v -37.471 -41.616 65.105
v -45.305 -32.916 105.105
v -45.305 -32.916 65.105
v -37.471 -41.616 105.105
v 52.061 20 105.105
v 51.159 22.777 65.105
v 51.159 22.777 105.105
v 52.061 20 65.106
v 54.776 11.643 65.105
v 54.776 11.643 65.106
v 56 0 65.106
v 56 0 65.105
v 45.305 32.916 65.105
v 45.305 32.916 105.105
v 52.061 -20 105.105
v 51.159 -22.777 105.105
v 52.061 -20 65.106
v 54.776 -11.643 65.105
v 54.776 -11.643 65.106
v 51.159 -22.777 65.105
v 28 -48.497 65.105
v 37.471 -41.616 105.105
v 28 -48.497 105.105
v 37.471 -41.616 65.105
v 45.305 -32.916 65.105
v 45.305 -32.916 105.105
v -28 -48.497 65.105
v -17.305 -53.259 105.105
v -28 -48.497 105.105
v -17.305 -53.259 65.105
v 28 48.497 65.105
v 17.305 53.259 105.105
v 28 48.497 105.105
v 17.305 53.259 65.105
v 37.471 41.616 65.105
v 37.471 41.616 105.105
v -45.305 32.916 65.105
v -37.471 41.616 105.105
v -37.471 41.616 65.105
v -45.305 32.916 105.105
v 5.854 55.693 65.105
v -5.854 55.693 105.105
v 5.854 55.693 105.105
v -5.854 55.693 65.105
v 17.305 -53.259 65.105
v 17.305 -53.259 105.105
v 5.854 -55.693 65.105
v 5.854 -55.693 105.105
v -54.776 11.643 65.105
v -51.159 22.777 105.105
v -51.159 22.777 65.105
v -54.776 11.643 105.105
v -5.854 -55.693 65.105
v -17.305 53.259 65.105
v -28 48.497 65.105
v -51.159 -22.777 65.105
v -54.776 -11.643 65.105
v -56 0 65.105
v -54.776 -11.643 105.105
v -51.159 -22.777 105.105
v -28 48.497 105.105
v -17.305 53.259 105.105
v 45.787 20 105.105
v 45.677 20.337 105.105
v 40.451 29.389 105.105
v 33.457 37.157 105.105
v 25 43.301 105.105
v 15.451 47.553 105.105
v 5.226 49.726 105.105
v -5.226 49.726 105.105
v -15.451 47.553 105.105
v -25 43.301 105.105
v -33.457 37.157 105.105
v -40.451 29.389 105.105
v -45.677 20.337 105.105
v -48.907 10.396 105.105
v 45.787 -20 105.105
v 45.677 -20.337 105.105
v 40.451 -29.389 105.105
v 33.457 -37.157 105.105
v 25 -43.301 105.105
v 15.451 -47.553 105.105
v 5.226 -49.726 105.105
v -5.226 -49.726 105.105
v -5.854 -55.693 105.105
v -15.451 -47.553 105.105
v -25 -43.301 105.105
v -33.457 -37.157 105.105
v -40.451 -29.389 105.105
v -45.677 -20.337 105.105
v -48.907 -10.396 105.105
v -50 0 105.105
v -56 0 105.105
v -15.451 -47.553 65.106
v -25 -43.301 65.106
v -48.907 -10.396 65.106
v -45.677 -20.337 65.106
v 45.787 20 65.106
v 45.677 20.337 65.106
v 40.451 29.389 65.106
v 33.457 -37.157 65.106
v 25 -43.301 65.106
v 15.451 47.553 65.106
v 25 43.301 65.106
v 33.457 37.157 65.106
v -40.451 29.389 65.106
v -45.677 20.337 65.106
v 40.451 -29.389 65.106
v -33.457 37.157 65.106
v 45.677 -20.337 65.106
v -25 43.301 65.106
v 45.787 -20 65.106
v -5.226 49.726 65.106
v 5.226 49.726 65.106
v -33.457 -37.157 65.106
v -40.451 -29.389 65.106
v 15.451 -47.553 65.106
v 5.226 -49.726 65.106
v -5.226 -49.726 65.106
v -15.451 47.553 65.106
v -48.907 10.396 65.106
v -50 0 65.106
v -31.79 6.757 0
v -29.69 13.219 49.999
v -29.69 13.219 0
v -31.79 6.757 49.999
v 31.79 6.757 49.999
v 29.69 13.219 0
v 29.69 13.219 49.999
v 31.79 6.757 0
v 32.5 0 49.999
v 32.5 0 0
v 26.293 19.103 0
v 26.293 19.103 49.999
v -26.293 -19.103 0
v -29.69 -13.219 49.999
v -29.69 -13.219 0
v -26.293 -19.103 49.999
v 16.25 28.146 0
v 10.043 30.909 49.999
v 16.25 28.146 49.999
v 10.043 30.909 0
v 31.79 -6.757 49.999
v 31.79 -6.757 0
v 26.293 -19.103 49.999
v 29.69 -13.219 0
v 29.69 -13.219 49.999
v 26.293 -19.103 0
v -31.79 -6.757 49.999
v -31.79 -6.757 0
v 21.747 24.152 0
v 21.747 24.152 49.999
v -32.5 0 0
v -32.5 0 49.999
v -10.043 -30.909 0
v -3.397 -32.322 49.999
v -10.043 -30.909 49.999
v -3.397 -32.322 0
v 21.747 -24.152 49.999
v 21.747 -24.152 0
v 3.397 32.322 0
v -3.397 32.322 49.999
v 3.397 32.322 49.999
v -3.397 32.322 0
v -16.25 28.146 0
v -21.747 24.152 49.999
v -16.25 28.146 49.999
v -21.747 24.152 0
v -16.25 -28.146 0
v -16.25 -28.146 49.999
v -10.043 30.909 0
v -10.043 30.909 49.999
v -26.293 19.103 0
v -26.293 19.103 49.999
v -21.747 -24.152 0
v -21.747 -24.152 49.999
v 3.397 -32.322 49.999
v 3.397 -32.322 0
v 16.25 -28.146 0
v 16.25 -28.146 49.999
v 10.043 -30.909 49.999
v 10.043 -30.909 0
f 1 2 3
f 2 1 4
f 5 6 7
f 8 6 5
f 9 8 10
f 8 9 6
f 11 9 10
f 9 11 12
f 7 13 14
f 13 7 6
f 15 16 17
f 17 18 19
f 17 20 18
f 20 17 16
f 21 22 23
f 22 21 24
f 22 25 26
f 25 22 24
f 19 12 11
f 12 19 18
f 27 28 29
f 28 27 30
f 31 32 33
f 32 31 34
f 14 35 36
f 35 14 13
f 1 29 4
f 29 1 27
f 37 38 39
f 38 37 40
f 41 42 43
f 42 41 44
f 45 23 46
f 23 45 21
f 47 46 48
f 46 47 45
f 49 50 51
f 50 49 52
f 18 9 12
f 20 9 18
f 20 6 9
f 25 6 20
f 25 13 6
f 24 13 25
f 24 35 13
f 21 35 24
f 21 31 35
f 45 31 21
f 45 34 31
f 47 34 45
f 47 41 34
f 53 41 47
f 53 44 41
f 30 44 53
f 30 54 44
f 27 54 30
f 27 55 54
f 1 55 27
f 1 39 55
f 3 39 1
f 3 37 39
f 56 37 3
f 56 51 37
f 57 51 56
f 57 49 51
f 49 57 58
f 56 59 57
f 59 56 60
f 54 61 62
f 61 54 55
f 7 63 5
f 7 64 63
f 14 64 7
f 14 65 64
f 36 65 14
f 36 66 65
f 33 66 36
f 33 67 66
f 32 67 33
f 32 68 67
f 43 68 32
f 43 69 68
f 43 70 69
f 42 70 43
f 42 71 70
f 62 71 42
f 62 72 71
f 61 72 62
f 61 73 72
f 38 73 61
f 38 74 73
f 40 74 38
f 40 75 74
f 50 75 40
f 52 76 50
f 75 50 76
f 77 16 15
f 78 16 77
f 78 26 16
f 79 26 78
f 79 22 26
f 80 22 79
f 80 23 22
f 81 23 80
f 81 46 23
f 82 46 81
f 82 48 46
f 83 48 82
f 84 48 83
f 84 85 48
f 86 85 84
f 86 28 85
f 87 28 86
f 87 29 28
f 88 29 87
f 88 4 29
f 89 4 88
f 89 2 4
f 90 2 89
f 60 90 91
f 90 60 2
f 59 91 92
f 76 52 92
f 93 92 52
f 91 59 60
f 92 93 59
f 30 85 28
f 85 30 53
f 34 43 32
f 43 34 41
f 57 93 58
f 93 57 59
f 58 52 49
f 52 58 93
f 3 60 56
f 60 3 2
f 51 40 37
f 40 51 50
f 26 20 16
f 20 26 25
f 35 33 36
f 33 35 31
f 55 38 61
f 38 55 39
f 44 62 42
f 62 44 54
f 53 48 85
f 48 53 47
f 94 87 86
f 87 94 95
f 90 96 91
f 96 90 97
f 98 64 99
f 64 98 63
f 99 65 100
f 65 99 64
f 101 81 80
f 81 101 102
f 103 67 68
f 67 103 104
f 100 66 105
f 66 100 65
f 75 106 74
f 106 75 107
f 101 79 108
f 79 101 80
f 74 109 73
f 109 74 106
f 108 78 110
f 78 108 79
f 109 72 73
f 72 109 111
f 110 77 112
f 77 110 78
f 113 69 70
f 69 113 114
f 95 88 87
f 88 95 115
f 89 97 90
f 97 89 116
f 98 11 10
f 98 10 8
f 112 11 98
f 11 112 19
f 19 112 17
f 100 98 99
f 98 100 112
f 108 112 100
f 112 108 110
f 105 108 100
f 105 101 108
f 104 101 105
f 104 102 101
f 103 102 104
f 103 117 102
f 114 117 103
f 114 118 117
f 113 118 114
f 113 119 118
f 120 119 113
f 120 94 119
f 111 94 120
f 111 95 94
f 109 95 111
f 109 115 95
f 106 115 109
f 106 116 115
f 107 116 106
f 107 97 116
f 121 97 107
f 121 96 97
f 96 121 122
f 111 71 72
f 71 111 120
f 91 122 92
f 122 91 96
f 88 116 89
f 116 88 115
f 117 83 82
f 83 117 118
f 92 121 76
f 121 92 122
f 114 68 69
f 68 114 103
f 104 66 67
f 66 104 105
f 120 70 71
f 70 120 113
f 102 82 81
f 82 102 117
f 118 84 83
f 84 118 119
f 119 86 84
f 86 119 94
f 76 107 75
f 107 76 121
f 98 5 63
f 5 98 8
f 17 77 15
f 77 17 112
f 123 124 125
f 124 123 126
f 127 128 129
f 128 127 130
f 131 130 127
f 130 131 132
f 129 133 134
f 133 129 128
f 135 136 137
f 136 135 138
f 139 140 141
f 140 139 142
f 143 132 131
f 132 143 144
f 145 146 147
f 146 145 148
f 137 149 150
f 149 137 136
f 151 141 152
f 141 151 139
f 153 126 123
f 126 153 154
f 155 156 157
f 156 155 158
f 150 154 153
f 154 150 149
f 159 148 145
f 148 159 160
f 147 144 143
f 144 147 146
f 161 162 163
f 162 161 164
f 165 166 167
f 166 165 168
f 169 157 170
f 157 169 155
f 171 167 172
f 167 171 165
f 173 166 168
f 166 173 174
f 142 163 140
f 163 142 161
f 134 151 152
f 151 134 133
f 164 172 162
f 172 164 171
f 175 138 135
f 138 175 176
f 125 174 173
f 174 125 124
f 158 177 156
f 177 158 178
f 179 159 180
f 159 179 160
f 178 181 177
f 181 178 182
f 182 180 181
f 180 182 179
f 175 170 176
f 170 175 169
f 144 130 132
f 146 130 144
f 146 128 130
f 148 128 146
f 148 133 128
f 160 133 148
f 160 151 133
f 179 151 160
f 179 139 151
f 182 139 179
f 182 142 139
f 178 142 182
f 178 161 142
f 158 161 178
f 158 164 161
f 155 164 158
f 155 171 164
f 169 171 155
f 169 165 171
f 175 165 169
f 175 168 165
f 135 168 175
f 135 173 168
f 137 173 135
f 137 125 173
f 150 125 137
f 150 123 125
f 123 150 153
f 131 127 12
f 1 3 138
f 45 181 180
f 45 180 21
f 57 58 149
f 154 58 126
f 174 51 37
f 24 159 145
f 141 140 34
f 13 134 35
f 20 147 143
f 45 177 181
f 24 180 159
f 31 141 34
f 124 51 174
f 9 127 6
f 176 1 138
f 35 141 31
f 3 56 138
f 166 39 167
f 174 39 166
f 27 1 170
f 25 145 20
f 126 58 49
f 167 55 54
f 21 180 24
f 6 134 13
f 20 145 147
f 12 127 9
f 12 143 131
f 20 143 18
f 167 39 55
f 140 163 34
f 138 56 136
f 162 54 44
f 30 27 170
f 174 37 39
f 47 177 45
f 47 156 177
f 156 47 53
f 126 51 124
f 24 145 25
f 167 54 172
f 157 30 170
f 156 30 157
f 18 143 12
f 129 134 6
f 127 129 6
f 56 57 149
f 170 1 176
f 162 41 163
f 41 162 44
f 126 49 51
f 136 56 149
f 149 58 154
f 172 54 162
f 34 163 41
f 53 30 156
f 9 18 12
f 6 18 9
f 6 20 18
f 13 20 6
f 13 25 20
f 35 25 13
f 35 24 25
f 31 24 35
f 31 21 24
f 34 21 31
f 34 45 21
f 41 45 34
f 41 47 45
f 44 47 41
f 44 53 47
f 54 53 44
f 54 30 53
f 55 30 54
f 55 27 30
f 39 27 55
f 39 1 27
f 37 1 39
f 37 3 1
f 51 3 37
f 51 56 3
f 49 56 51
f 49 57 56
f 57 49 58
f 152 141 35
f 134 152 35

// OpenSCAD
dep = 50;
wr = 65/2;
or = 100/2;
h = 40;
wall = 3;
rerr = 0.001;

cylinder(r=wr, h=dep);

angled_height = ((or + wall*2) - wr) * cos(50);
translate([0, 0, dep-rerr])
cylinder(angled_height, wr, (or + wall*2));

translate([0, 0, dep + angled_height - rerr]) {
  difference() {
    cylinder(r=or + wall*2, h=h);

    translate([0, 0, rerr])
    cylinder(r=or, h=h);

    translate([wr/2, -h/2, rerr])
    # cube(h);
  }
}
